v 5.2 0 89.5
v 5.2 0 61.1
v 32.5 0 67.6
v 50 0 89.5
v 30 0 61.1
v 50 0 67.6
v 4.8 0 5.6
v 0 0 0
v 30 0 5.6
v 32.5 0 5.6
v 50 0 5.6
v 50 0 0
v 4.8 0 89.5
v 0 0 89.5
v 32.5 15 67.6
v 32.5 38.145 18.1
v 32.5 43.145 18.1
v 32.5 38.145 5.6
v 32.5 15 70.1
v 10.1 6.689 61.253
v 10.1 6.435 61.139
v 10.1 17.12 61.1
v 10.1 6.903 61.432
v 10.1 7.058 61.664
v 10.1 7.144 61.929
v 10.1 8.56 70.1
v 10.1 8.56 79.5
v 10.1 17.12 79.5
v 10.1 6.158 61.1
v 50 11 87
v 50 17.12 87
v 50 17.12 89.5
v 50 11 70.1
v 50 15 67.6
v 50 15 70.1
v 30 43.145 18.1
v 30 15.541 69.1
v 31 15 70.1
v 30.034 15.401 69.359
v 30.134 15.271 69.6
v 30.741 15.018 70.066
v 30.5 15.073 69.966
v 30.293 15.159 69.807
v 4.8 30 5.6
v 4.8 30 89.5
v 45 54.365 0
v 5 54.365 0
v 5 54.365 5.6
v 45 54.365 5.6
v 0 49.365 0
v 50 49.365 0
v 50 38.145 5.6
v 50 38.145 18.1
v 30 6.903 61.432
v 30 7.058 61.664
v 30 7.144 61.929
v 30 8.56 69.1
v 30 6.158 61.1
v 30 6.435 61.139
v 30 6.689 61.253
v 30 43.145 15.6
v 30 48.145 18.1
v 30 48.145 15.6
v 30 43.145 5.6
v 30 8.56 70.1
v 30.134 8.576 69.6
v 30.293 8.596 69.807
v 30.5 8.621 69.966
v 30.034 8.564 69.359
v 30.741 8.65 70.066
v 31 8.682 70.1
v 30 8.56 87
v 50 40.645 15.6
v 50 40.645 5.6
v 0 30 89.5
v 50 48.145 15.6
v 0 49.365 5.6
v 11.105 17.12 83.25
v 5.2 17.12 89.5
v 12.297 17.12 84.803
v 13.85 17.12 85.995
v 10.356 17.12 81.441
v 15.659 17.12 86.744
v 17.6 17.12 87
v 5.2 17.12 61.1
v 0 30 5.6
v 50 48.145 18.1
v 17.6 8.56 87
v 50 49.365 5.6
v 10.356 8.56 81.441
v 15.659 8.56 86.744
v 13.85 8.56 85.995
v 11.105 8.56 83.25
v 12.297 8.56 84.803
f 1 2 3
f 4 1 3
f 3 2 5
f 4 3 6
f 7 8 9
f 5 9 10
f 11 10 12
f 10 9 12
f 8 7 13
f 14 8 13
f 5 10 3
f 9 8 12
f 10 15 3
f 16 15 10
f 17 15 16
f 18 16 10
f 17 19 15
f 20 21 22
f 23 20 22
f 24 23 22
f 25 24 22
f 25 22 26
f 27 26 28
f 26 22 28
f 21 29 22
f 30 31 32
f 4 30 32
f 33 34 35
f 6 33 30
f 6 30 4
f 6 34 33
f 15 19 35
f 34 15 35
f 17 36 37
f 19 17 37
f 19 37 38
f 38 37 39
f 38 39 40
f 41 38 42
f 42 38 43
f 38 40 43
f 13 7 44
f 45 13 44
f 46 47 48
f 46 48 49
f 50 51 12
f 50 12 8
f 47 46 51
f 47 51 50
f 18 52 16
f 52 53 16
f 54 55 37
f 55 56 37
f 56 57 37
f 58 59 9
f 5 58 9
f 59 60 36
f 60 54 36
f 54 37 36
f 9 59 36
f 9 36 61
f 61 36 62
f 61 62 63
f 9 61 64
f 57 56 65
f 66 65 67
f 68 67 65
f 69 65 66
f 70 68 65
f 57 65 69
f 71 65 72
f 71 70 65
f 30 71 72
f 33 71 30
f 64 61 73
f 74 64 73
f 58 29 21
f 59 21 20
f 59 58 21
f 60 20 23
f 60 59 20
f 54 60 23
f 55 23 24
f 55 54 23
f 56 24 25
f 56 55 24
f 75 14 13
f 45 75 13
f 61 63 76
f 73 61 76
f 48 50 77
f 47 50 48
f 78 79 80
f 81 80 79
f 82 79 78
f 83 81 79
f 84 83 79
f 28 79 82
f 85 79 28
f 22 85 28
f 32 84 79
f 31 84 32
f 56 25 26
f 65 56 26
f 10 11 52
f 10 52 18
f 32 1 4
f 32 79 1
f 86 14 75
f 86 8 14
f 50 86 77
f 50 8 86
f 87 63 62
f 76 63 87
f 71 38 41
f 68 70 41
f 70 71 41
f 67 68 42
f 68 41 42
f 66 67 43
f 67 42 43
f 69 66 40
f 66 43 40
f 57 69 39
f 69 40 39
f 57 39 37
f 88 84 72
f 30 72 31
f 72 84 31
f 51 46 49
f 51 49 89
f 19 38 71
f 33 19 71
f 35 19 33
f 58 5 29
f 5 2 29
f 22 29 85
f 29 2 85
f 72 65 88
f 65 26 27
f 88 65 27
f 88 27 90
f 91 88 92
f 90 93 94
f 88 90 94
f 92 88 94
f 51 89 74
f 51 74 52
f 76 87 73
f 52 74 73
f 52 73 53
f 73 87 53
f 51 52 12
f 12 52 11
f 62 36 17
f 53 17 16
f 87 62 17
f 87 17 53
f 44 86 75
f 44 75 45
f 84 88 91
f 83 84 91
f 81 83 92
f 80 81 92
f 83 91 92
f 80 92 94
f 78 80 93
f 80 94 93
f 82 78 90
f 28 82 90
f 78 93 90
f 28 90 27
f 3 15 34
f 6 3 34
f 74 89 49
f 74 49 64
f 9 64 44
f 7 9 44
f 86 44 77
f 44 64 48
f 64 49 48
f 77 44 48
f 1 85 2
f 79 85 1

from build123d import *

# Parameters (mm, degrees)
EXTRUDE_1_DEPTH  = 5.6
SKETCH_3_W       = 20
SKETCH_3_H       = 10
EXTRUDE_2_DEPTH  = 2.5
EXTRUDE_3_REACH  = 77.491
EXTRUDE_4_DEPTH  = 2.5
SKETCH_7_W       = 28.4
SKETCH_7_H       = 17.12
EXTRUDE_5_DEPTH  = 4.9
SKETCH_8_W       = 39.9
SKETCH_8_H       = 17.12
EXTRUDE_6_DEPTH  = 2.5
SKETCH_9_W       = 17.5
SKETCH_9_H       = 15
EXTRUDE_7_DEPTH  = 2.5
EXTRUDE_8_DEPTH  = 19.9
FILLET_1_R       = 1
EXTRUDE_9_REACH  = 103.831
SKETCH_14_W      = 4.8
SKETCH_14_H      = 30
EXTRUDE_12_DEPTH = 83.9
EXTRUDE_13_DEPTH = 8.56
FILLET_3_R       = 1


with BuildPart() as part:
    # 草图1 → 凸台-拉伸1 (new body)
    with BuildSketch(Plane.XY):
        Polygon((0, 49.365), (5, 54.365), (45, 54.365), (50, 49.365), (50, 0), (0, 0), align=None)
    extrude(amount=EXTRUDE_1_DEPTH)

    # 草图5 → 凸台-拉伸3 (add, up to next)
    with BuildSketch(Plane(origin=(0, 0, 15.6), x_dir=(-1, 0, 0), z_dir=(0, 0, -1)), mode=Mode.PRIVATE) as extrude_3_sk1:
        Polygon((-30, 43.145), (-50, 40.645), (-50, 38.145), (-30, 38.145), align=None)
    extrude_3_tool1 = extrude(extrude_3_sk1.sketch, amount=EXTRUDE_3_REACH, mode=Mode.PRIVATE) - part.part


with BuildPart() as body_2:
    # 草图3 → 凸台-拉伸2 (new body)
    with BuildSketch(Plane.XY.offset(15.6)):
        with Locations((40, 43.145)):
            Rectangle(SKETCH_3_W, SKETCH_3_H)
    extrude(amount=EXTRUDE_2_DEPTH)


with BuildPart() as part_1:
    add(part.part)

    add(body_2.part)  # 凸台-拉伸3 merges body 2
    add(extrude_3_tool1.solids().sort_by_distance((38.888889, 40.089444, 15.6))[0])

    # 草图6 → 凸台-拉伸4 (add)
    with BuildSketch(Plane.ZY.offset(-30)):
        Polygon((18.1, 43.145), (70.1, 15), (70.1, 0), (5.6, 0), (5.6, 38.145), (18.1, 38.145), align=None)
    extrude(amount=-EXTRUDE_4_DEPTH)

    # 草图9 → 凸台-拉伸7 (add)
    with BuildSketch(Plane.XY.offset(70.1)):
        with Locations((41.25, 7.5)):
            Rectangle(SKETCH_9_W, SKETCH_9_H)
    extrude(amount=-EXTRUDE_7_DEPTH)



with BuildPart() as body_2_2:
    # 草图7 → 凸台-拉伸5 (new body)
    with BuildSketch(Plane.ZY.offset(-5.2)):
        with Locations((75.3, 8.56)):
            Rectangle(SKETCH_7_W, SKETCH_7_H)
    extrude(amount=-EXTRUDE_5_DEPTH)

    # 草图8 → 凸台-拉伸6 (add)
    with BuildSketch(Plane.XY.offset(89.5)):
        with Locations((30.05, 8.56)):
            Rectangle(SKETCH_8_W, SKETCH_8_H)
    extrude(amount=-EXTRUDE_6_DEPTH)


with BuildPart() as part_2:
    add(part_1.part)

    add(body_2_2.part)  # 凸台-拉伸8 merges body 2 2
    # 草图11 → 凸台-拉伸8 (add)
    with BuildSketch(Plane(origin=(10.1, 0, 0), x_dir=(0, 0, -1), z_dir=(1, 0, 0))):
        Polygon((-61.1, 0), (-61.1, 7), (-70.1, 8.56), (-87, 8.56), (-87, 0), align=None)
    extrude(amount=EXTRUDE_8_DEPTH)

    # 圆角1
    fillet_1_edges = [part_2.edges().sort_by_distance(p)[0] for p in [
        (20.05, 7, 61.1),
    ]]
    fillet(fillet_1_edges, radius=FILLET_1_R)

    # 草图12 → 凸台-拉伸9 (add, up to next)
    with BuildSketch(Plane.XY.offset(70.1), mode=Mode.PRIVATE) as extrude_9_sk1:
        Polygon((30, 0), (30, 8.56), (50, 11), (50, 0), align=None)
    extrude_9_tool1 = extrude(extrude_9_sk1.sketch, amount=EXTRUDE_9_REACH, mode=Mode.PRIVATE) - part_2.part
    add(extrude_9_tool1.solids().sort_by_distance((40.415815, 4.915365, 70.1))[0])

    # 草图14 → 凸台-拉伸12 (add)
    with BuildSketch(Plane.XY.offset(5.6)):
        with Locations((2.4, 15)):
            Rectangle(SKETCH_14_W, SKETCH_14_H)
    extrude(amount=EXTRUDE_12_DEPTH)

    # 草图15 → 凸台-拉伸13 (add)
    with BuildSketch(Plane(origin=(0, 8.56, 0), x_dir=(1, 0, 0), z_dir=(0, 1, 0))):
        with BuildLine():
            Line((10.1, -79.5), (10.1, -87))
            Line((10.1, -87), (17.6, -87))
            ThreePointArc((17.6, -87), (12.296699141, -84.803300859), (10.1, -79.5))
        make_face()
    extrude(amount=EXTRUDE_13_DEPTH)

    # 圆角3
    # the kernel refuses this fillet: 1 mm, written as the material it takes off along each edge
    with BuildSketch(Plane(origin=(30, 17.5, 70.1), x_dir=(0, 0, -1), z_dir=(0, -1, 0))) as fillet_3_piece_1_section:
        with BuildLine():
            CenterArc((FILLET_3_R, FILLET_3_R), FILLET_3_R, 180, 90)
            Line((0, FILLET_3_R), (0, 0))
            Line((0, 0), (FILLET_3_R, 0))
        make_face()
    fillet_3_piece_1 = extrude(amount=11.44, mode=Mode.PRIVATE)
    fillet_3_piece_1 = split(fillet_3_piece_1, bisect_by=Plane(origin=(30.761446194, 8.652896436, 69.873228865), z_dir=(-0.12110208706144665, 0.9926400578806811, 0)), keep=Keep.TOP, mode=Mode.PRIVATE)
    add(fillet_3_piece_1, mode=Mode.SUBTRACT)


solid = part_2.part
